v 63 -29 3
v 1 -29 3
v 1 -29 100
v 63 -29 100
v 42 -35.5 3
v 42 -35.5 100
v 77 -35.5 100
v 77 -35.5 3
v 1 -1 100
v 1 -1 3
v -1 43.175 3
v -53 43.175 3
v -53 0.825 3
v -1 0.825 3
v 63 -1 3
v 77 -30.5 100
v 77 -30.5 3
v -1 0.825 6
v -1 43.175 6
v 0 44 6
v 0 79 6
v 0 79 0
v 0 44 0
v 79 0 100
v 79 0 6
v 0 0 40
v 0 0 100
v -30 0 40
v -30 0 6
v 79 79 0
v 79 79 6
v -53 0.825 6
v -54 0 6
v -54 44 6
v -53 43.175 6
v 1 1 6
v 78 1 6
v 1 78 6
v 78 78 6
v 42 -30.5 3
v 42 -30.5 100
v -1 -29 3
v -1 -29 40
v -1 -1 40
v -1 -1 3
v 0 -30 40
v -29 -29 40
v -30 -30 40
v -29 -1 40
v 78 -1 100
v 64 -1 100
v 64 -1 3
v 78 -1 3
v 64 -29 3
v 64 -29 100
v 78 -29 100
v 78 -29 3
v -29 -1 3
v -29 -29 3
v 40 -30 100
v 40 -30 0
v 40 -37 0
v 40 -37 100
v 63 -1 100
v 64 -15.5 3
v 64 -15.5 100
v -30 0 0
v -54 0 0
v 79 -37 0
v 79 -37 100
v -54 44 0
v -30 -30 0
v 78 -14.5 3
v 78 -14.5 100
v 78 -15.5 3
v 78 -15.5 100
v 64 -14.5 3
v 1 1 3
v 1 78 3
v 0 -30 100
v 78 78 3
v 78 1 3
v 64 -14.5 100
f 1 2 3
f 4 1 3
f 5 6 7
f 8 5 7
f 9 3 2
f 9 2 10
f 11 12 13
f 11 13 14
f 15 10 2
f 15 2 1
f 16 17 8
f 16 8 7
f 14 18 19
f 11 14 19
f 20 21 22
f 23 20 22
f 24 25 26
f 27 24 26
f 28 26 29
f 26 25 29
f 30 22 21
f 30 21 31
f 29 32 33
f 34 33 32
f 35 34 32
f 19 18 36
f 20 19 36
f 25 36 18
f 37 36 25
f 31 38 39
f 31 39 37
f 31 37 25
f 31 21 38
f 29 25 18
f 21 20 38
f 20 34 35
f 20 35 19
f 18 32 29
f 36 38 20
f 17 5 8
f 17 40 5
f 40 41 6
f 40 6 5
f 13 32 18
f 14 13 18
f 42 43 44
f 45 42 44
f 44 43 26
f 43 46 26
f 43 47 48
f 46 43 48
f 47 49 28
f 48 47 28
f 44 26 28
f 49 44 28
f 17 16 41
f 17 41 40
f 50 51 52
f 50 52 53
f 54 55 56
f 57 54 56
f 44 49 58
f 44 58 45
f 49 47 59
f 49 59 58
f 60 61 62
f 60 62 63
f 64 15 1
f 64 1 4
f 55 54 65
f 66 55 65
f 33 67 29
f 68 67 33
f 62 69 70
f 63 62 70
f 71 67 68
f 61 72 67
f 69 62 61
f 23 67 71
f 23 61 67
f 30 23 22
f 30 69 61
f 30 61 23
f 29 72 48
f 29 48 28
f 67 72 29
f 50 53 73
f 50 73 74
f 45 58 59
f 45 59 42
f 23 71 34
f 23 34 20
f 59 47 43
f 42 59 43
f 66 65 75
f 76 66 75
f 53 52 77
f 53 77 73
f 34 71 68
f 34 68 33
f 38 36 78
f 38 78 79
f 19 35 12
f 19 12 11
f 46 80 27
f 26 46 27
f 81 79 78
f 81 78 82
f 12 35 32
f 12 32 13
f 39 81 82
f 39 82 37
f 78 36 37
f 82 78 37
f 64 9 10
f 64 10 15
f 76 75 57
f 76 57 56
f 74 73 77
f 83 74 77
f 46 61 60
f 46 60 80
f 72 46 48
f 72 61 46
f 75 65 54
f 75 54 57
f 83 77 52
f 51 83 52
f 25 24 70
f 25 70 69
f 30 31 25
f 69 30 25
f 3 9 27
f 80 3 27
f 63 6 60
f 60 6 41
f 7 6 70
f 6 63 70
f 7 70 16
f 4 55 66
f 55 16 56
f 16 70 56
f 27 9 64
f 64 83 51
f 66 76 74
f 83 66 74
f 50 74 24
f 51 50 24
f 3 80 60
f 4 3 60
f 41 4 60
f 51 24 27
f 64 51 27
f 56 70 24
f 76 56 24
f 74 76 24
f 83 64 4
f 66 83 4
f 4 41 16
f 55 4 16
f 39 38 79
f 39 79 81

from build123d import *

# Parameters (mm, degrees)
SKETCH1_W            = 82
SKETCH1_H            = 82
BOSS_EXTRUDE1_DEPTH  = 6
SKETCH2_W            = 80
SKETCH2_H            = 80
CUT_EXTRUDE1_DEPTH   = 3
SKETCH3_W            = 82
SKETCH3_H            = 30
BOSS_EXTRUDE2_DEPTH  = 100
SKETCH4_W            = 80
SKETCH4_H            = 28
CUT_EXTRUDE2_DEPTH   = 97
SKETCH5_W            = 30
SKETCH5_H            = 30
BOSS_EXTRUDE3_DEPTH  = 40
SKETCH6_W            = 28
SKETCH6_H            = 28
CUT_EXTRUDE3_DEPTH   = 37
SKETCH7_W            = 57
SKETCH7_H            = 47
BOSS_EXTRUDE4_DEPTH  = 6
SKETCH9_W            = 55
SKETCH9_H            = 45.350877192
CUT_EXTRUDE4_DEPTH   = 3
SKETCH10_W           = 39
SKETCH10_H           = 100
BOSS_EXTRUDE6_DEPTH  = 7
SKETCH12_W           = 35
SKETCH12_H           = 5
CUT_EXTRUDE5_DEPTH   = 97
SKETCH13_W           = 55
SKETCH13_H           = 3
BOSS_EXTRUDE7_DEPTH  = 3
SKETCH14_W           = 3
SKETCH14_H           = 42.350877192
BOSS_EXTRUDE8_DEPTH  = 3
SKETCH15_W           = 6
SKETCH15_H           = 47
CUT_EXTRUDE6_DEPTH   = 3
SKETCH16_W           = 54
SKETCH16_H           = 6
CUT_EXTRUDE7_DEPTH   = 3
SKETCH17_W           = 3
SKETCH17_H           = 80
BOSS_EXTRUDE9_DEPTH  = 3
SKETCH18_W           = 77
SKETCH18_H           = 3
BOSS_EXTRUDE10_DEPTH = 3
SKETCH19_W           = 97
SKETCH19_H           = 28
BOSS_EXTRUDE11_DEPTH = 3
SKETCH20_W           = 100
SKETCH20_H           = 7
BOSS_EXTRUDE12_DEPTH = 3
SKETCH21_W           = 97
SKETCH21_H           = 5
CUT_EXTRUDE8_DEPTH   = 3
SKETCH22_W           = 97
SKETCH22_H           = 5
BOSS_EXTRUDE13_DEPTH = 3
SKETCH23_W           = 100
SKETCH23_H           = 119
CUT_EXTRUDE9_DEPTH   = 3
SKETCH24_W           = 79
SKETCH24_H           = 6
CUT_EXTRUDE10_DEPTH  = 3
SKETCH25_W           = 2
SKETCH25_H           = 28
BOSS_EXTRUDE14_DEPTH = 97
SKETCH26_W           = 13
SKETCH26_H           = 1
SKETCH26_W_2         = 1
BOSS_EXTRUDE16_DEPTH = 97
SKETCH31_W           = 97
SKETCH31_H           = 28
CUT_EXTRUDE11_DEPTH  = 1


with BuildPart() as part:
    # Sketch1 → Boss-Extrude1 (new body)
    with BuildSketch(Plane.XY):
        with Locations((41, 41)):
            Rectangle(SKETCH1_W, SKETCH1_H)
    extrude(amount=BOSS_EXTRUDE1_DEPTH)

    # Sketch2 → Cut-Extrude1 (cut)
    with BuildSketch(Plane.XY.offset(6)):
        with Locations((41, 41)):
            Rectangle(SKETCH2_W, SKETCH2_H)
    extrude(amount=-CUT_EXTRUDE1_DEPTH, mode=Mode.SUBTRACT)

    # Sketch3 → Boss-Extrude2 (add)
    with BuildSketch(Plane(origin=(0, 0, 0), x_dir=(-1, 0, 0), z_dir=(0, 0, -1))):
        with Locations((-41, -15)):
            Rectangle(SKETCH3_W, SKETCH3_H)
    extrude(amount=-BOSS_EXTRUDE2_DEPTH)

    # Sketch4 → Cut-Extrude2 (cut)
    with BuildSketch(Plane.XY.offset(100)):
        with Locations((41, -15)):
            Rectangle(SKETCH4_W, SKETCH4_H)
    extrude(amount=-CUT_EXTRUDE2_DEPTH, mode=Mode.SUBTRACT)

    # Sketch5 → Boss-Extrude3 (add)
    with BuildSketch(Plane(origin=(0, 0, 0), x_dir=(-1, 0, 0), z_dir=(0, 0, -1))):
        with Locations((15, -15)):
            Rectangle(SKETCH5_W, SKETCH5_H)
    extrude(amount=-BOSS_EXTRUDE3_DEPTH)

    # Sketch6 → Cut-Extrude3 (cut)
    with BuildSketch(Plane.XY.offset(40)):
        with Locations((-15, -15)):
            Rectangle(SKETCH6_W, SKETCH6_H)
    extrude(amount=-CUT_EXTRUDE3_DEPTH, mode=Mode.SUBTRACT)

    # Sketch7 → Boss-Extrude4 (add)
    with BuildSketch(Plane(origin=(0, 0, 0), x_dir=(-1, 0, 0), z_dir=(0, 0, -1))):
        with Locations((28.5, 23.5)):
            Rectangle(SKETCH7_W, SKETCH7_H)
    extrude(amount=-BOSS_EXTRUDE4_DEPTH)

    # Sketch9 → Cut-Extrude4 (cut)
    with BuildSketch(Plane.XY.offset(6)):
        with Locations((-28.5, 23.5)):
            Rectangle(SKETCH9_W, SKETCH9_H)
    extrude(amount=-CUT_EXTRUDE4_DEPTH, mode=Mode.SUBTRACT)

    # Sketch10 → Boss-Extrude6 (add)
    with BuildSketch(Plane(origin=(0, -30, 0), x_dir=(-1, 0, 0), z_dir=(0, -1, 0))):
        with Locations((-62.5, -50)):
            Rectangle(SKETCH10_W, SKETCH10_H)
    extrude(amount=BOSS_EXTRUDE6_DEPTH)

    # Sketch12 → Cut-Extrude5 (cut)
    with BuildSketch(Plane.XY.offset(100)):
        with Locations((62.5, -33)):
            Rectangle(SKETCH12_W, SKETCH12_H)
    extrude(amount=-CUT_EXTRUDE5_DEPTH, mode=Mode.SUBTRACT)

    # Sketch13 → Boss-Extrude7 (add)
    with BuildSketch(Plane.XZ.offset(-46.175438596)):
        with Locations((-28.5, 4.5)):
            Rectangle(SKETCH13_W, SKETCH13_H)
    extrude(amount=BOSS_EXTRUDE7_DEPTH)

    # Sketch14 → Boss-Extrude8 (add)
    with BuildSketch(Plane(origin=(-56, 0, 0), x_dir=(0, 0, -1), z_dir=(1, 0, 0))):
        with Locations((-4.5, 22)):
            Rectangle(SKETCH14_W, SKETCH14_H)
    extrude(amount=BOSS_EXTRUDE8_DEPTH)

    # Sketch15 → Cut-Extrude6 (cut)
    with BuildSketch(Plane.ZY.offset(57)):
        with Locations((3, 23.5)):
            Rectangle(SKETCH15_W, SKETCH15_H)
    extrude(amount=-CUT_EXTRUDE6_DEPTH, mode=Mode.SUBTRACT)

    # Sketch16 → Cut-Extrude7 (cut)
    with BuildSketch(Plane(origin=(0, 47, 0), x_dir=(1, 0, 0), z_dir=(0, 1, 0))):
        with Locations((-27, -3)):
            Rectangle(SKETCH16_W, SKETCH16_H)
    extrude(amount=-CUT_EXTRUDE7_DEPTH, mode=Mode.SUBTRACT)

    # Sketch17 → Boss-Extrude9 (add)
    with BuildSketch(Plane.ZY.offset(-81)):
        with Locations((4.5, 41)):
            Rectangle(SKETCH17_W, SKETCH17_H)
    extrude(amount=BOSS_EXTRUDE9_DEPTH)

    # Sketch18 → Boss-Extrude10 (add)
    with BuildSketch(Plane.XZ.offset(-81)):
        with Locations((39.5, 4.5)):
            Rectangle(SKETCH18_W, SKETCH18_H)
    extrude(amount=BOSS_EXTRUDE10_DEPTH)

    # Sketch19 → Boss-Extrude11 (add)
    with BuildSketch(Plane.ZY.offset(-81)):
        with Locations((51.5, -15)):
            Rectangle(SKETCH19_W, SKETCH19_H)
    extrude(amount=BOSS_EXTRUDE11_DEPTH)

    # Sketch20 → Boss-Extrude12 (add)
    with BuildSketch(Plane.ZY.offset(-43)):
        with Locations((50, -33.5)):
            Rectangle(SKETCH20_W, SKETCH20_H)
    extrude(amount=BOSS_EXTRUDE12_DEPTH)

    # Sketch21 → Cut-Extrude8 (cut)
    with BuildSketch(Plane(origin=(45, 0, 0), x_dir=(0, 0, -1), z_dir=(1, 0, 0))):
        with Locations((-51.5, -33)):
            Rectangle(SKETCH21_W, SKETCH21_H)
    extrude(amount=-CUT_EXTRUDE8_DEPTH, mode=Mode.SUBTRACT)

    # Sketch22 → Boss-Extrude13 (add)
    with BuildSketch(Plane.ZY.offset(-80)):
        with Locations((51.5, -33)):
            Rectangle(SKETCH22_W, SKETCH22_H)
    extrude(amount=BOSS_EXTRUDE13_DEPTH)

    # Sketch23 → Cut-Extrude9 (cut)
    with BuildSketch(Plane(origin=(82, 0, 0), x_dir=(0, 0, -1), z_dir=(1, 0, 0))):
        with Locations((-50, 22.5)):
            Rectangle(SKETCH23_W, SKETCH23_H)
    extrude(amount=-CUT_EXTRUDE9_DEPTH, mode=Mode.SUBTRACT)

    # Sketch24 → Cut-Extrude10 (cut)
    with BuildSketch(Plane(origin=(0, 82, 0), x_dir=(1, 0, 0), z_dir=(0, 1, 0))):
        with Locations((39.5, -3)):
            Rectangle(SKETCH24_W, SKETCH24_H)
    extrude(amount=-CUT_EXTRUDE10_DEPTH, mode=Mode.SUBTRACT)

    # Sketch25 → Boss-Extrude14 (add)
    with BuildSketch(Plane.XY.offset(3)):
        with Locations((63, -15)):
            Rectangle(SKETCH25_W, SKETCH25_H)
    extrude(amount=BOSS_EXTRUDE14_DEPTH)

    # Sketch26 → Boss-Extrude16 (add)
    with BuildSketch(Plane.XY.offset(3)):
        with Locations((70.5, -15)):
            Rectangle(SKETCH26_W, SKETCH26_H)
        with Locations((77.5, -15)):
            Rectangle(SKETCH26_W_2, SKETCH26_H)
    extrude(amount=BOSS_EXTRUDE16_DEPTH)

    # Sketch31 → Cut-Extrude11 (cut)
    with BuildSketch(Plane.ZY.offset(-62)):
        with Locations((51.5, -15)):
            Rectangle(SKETCH31_W, SKETCH31_H)
    extrude(amount=-CUT_EXTRUDE11_DEPTH, mode=Mode.SUBTRACT)


solid = part.part
